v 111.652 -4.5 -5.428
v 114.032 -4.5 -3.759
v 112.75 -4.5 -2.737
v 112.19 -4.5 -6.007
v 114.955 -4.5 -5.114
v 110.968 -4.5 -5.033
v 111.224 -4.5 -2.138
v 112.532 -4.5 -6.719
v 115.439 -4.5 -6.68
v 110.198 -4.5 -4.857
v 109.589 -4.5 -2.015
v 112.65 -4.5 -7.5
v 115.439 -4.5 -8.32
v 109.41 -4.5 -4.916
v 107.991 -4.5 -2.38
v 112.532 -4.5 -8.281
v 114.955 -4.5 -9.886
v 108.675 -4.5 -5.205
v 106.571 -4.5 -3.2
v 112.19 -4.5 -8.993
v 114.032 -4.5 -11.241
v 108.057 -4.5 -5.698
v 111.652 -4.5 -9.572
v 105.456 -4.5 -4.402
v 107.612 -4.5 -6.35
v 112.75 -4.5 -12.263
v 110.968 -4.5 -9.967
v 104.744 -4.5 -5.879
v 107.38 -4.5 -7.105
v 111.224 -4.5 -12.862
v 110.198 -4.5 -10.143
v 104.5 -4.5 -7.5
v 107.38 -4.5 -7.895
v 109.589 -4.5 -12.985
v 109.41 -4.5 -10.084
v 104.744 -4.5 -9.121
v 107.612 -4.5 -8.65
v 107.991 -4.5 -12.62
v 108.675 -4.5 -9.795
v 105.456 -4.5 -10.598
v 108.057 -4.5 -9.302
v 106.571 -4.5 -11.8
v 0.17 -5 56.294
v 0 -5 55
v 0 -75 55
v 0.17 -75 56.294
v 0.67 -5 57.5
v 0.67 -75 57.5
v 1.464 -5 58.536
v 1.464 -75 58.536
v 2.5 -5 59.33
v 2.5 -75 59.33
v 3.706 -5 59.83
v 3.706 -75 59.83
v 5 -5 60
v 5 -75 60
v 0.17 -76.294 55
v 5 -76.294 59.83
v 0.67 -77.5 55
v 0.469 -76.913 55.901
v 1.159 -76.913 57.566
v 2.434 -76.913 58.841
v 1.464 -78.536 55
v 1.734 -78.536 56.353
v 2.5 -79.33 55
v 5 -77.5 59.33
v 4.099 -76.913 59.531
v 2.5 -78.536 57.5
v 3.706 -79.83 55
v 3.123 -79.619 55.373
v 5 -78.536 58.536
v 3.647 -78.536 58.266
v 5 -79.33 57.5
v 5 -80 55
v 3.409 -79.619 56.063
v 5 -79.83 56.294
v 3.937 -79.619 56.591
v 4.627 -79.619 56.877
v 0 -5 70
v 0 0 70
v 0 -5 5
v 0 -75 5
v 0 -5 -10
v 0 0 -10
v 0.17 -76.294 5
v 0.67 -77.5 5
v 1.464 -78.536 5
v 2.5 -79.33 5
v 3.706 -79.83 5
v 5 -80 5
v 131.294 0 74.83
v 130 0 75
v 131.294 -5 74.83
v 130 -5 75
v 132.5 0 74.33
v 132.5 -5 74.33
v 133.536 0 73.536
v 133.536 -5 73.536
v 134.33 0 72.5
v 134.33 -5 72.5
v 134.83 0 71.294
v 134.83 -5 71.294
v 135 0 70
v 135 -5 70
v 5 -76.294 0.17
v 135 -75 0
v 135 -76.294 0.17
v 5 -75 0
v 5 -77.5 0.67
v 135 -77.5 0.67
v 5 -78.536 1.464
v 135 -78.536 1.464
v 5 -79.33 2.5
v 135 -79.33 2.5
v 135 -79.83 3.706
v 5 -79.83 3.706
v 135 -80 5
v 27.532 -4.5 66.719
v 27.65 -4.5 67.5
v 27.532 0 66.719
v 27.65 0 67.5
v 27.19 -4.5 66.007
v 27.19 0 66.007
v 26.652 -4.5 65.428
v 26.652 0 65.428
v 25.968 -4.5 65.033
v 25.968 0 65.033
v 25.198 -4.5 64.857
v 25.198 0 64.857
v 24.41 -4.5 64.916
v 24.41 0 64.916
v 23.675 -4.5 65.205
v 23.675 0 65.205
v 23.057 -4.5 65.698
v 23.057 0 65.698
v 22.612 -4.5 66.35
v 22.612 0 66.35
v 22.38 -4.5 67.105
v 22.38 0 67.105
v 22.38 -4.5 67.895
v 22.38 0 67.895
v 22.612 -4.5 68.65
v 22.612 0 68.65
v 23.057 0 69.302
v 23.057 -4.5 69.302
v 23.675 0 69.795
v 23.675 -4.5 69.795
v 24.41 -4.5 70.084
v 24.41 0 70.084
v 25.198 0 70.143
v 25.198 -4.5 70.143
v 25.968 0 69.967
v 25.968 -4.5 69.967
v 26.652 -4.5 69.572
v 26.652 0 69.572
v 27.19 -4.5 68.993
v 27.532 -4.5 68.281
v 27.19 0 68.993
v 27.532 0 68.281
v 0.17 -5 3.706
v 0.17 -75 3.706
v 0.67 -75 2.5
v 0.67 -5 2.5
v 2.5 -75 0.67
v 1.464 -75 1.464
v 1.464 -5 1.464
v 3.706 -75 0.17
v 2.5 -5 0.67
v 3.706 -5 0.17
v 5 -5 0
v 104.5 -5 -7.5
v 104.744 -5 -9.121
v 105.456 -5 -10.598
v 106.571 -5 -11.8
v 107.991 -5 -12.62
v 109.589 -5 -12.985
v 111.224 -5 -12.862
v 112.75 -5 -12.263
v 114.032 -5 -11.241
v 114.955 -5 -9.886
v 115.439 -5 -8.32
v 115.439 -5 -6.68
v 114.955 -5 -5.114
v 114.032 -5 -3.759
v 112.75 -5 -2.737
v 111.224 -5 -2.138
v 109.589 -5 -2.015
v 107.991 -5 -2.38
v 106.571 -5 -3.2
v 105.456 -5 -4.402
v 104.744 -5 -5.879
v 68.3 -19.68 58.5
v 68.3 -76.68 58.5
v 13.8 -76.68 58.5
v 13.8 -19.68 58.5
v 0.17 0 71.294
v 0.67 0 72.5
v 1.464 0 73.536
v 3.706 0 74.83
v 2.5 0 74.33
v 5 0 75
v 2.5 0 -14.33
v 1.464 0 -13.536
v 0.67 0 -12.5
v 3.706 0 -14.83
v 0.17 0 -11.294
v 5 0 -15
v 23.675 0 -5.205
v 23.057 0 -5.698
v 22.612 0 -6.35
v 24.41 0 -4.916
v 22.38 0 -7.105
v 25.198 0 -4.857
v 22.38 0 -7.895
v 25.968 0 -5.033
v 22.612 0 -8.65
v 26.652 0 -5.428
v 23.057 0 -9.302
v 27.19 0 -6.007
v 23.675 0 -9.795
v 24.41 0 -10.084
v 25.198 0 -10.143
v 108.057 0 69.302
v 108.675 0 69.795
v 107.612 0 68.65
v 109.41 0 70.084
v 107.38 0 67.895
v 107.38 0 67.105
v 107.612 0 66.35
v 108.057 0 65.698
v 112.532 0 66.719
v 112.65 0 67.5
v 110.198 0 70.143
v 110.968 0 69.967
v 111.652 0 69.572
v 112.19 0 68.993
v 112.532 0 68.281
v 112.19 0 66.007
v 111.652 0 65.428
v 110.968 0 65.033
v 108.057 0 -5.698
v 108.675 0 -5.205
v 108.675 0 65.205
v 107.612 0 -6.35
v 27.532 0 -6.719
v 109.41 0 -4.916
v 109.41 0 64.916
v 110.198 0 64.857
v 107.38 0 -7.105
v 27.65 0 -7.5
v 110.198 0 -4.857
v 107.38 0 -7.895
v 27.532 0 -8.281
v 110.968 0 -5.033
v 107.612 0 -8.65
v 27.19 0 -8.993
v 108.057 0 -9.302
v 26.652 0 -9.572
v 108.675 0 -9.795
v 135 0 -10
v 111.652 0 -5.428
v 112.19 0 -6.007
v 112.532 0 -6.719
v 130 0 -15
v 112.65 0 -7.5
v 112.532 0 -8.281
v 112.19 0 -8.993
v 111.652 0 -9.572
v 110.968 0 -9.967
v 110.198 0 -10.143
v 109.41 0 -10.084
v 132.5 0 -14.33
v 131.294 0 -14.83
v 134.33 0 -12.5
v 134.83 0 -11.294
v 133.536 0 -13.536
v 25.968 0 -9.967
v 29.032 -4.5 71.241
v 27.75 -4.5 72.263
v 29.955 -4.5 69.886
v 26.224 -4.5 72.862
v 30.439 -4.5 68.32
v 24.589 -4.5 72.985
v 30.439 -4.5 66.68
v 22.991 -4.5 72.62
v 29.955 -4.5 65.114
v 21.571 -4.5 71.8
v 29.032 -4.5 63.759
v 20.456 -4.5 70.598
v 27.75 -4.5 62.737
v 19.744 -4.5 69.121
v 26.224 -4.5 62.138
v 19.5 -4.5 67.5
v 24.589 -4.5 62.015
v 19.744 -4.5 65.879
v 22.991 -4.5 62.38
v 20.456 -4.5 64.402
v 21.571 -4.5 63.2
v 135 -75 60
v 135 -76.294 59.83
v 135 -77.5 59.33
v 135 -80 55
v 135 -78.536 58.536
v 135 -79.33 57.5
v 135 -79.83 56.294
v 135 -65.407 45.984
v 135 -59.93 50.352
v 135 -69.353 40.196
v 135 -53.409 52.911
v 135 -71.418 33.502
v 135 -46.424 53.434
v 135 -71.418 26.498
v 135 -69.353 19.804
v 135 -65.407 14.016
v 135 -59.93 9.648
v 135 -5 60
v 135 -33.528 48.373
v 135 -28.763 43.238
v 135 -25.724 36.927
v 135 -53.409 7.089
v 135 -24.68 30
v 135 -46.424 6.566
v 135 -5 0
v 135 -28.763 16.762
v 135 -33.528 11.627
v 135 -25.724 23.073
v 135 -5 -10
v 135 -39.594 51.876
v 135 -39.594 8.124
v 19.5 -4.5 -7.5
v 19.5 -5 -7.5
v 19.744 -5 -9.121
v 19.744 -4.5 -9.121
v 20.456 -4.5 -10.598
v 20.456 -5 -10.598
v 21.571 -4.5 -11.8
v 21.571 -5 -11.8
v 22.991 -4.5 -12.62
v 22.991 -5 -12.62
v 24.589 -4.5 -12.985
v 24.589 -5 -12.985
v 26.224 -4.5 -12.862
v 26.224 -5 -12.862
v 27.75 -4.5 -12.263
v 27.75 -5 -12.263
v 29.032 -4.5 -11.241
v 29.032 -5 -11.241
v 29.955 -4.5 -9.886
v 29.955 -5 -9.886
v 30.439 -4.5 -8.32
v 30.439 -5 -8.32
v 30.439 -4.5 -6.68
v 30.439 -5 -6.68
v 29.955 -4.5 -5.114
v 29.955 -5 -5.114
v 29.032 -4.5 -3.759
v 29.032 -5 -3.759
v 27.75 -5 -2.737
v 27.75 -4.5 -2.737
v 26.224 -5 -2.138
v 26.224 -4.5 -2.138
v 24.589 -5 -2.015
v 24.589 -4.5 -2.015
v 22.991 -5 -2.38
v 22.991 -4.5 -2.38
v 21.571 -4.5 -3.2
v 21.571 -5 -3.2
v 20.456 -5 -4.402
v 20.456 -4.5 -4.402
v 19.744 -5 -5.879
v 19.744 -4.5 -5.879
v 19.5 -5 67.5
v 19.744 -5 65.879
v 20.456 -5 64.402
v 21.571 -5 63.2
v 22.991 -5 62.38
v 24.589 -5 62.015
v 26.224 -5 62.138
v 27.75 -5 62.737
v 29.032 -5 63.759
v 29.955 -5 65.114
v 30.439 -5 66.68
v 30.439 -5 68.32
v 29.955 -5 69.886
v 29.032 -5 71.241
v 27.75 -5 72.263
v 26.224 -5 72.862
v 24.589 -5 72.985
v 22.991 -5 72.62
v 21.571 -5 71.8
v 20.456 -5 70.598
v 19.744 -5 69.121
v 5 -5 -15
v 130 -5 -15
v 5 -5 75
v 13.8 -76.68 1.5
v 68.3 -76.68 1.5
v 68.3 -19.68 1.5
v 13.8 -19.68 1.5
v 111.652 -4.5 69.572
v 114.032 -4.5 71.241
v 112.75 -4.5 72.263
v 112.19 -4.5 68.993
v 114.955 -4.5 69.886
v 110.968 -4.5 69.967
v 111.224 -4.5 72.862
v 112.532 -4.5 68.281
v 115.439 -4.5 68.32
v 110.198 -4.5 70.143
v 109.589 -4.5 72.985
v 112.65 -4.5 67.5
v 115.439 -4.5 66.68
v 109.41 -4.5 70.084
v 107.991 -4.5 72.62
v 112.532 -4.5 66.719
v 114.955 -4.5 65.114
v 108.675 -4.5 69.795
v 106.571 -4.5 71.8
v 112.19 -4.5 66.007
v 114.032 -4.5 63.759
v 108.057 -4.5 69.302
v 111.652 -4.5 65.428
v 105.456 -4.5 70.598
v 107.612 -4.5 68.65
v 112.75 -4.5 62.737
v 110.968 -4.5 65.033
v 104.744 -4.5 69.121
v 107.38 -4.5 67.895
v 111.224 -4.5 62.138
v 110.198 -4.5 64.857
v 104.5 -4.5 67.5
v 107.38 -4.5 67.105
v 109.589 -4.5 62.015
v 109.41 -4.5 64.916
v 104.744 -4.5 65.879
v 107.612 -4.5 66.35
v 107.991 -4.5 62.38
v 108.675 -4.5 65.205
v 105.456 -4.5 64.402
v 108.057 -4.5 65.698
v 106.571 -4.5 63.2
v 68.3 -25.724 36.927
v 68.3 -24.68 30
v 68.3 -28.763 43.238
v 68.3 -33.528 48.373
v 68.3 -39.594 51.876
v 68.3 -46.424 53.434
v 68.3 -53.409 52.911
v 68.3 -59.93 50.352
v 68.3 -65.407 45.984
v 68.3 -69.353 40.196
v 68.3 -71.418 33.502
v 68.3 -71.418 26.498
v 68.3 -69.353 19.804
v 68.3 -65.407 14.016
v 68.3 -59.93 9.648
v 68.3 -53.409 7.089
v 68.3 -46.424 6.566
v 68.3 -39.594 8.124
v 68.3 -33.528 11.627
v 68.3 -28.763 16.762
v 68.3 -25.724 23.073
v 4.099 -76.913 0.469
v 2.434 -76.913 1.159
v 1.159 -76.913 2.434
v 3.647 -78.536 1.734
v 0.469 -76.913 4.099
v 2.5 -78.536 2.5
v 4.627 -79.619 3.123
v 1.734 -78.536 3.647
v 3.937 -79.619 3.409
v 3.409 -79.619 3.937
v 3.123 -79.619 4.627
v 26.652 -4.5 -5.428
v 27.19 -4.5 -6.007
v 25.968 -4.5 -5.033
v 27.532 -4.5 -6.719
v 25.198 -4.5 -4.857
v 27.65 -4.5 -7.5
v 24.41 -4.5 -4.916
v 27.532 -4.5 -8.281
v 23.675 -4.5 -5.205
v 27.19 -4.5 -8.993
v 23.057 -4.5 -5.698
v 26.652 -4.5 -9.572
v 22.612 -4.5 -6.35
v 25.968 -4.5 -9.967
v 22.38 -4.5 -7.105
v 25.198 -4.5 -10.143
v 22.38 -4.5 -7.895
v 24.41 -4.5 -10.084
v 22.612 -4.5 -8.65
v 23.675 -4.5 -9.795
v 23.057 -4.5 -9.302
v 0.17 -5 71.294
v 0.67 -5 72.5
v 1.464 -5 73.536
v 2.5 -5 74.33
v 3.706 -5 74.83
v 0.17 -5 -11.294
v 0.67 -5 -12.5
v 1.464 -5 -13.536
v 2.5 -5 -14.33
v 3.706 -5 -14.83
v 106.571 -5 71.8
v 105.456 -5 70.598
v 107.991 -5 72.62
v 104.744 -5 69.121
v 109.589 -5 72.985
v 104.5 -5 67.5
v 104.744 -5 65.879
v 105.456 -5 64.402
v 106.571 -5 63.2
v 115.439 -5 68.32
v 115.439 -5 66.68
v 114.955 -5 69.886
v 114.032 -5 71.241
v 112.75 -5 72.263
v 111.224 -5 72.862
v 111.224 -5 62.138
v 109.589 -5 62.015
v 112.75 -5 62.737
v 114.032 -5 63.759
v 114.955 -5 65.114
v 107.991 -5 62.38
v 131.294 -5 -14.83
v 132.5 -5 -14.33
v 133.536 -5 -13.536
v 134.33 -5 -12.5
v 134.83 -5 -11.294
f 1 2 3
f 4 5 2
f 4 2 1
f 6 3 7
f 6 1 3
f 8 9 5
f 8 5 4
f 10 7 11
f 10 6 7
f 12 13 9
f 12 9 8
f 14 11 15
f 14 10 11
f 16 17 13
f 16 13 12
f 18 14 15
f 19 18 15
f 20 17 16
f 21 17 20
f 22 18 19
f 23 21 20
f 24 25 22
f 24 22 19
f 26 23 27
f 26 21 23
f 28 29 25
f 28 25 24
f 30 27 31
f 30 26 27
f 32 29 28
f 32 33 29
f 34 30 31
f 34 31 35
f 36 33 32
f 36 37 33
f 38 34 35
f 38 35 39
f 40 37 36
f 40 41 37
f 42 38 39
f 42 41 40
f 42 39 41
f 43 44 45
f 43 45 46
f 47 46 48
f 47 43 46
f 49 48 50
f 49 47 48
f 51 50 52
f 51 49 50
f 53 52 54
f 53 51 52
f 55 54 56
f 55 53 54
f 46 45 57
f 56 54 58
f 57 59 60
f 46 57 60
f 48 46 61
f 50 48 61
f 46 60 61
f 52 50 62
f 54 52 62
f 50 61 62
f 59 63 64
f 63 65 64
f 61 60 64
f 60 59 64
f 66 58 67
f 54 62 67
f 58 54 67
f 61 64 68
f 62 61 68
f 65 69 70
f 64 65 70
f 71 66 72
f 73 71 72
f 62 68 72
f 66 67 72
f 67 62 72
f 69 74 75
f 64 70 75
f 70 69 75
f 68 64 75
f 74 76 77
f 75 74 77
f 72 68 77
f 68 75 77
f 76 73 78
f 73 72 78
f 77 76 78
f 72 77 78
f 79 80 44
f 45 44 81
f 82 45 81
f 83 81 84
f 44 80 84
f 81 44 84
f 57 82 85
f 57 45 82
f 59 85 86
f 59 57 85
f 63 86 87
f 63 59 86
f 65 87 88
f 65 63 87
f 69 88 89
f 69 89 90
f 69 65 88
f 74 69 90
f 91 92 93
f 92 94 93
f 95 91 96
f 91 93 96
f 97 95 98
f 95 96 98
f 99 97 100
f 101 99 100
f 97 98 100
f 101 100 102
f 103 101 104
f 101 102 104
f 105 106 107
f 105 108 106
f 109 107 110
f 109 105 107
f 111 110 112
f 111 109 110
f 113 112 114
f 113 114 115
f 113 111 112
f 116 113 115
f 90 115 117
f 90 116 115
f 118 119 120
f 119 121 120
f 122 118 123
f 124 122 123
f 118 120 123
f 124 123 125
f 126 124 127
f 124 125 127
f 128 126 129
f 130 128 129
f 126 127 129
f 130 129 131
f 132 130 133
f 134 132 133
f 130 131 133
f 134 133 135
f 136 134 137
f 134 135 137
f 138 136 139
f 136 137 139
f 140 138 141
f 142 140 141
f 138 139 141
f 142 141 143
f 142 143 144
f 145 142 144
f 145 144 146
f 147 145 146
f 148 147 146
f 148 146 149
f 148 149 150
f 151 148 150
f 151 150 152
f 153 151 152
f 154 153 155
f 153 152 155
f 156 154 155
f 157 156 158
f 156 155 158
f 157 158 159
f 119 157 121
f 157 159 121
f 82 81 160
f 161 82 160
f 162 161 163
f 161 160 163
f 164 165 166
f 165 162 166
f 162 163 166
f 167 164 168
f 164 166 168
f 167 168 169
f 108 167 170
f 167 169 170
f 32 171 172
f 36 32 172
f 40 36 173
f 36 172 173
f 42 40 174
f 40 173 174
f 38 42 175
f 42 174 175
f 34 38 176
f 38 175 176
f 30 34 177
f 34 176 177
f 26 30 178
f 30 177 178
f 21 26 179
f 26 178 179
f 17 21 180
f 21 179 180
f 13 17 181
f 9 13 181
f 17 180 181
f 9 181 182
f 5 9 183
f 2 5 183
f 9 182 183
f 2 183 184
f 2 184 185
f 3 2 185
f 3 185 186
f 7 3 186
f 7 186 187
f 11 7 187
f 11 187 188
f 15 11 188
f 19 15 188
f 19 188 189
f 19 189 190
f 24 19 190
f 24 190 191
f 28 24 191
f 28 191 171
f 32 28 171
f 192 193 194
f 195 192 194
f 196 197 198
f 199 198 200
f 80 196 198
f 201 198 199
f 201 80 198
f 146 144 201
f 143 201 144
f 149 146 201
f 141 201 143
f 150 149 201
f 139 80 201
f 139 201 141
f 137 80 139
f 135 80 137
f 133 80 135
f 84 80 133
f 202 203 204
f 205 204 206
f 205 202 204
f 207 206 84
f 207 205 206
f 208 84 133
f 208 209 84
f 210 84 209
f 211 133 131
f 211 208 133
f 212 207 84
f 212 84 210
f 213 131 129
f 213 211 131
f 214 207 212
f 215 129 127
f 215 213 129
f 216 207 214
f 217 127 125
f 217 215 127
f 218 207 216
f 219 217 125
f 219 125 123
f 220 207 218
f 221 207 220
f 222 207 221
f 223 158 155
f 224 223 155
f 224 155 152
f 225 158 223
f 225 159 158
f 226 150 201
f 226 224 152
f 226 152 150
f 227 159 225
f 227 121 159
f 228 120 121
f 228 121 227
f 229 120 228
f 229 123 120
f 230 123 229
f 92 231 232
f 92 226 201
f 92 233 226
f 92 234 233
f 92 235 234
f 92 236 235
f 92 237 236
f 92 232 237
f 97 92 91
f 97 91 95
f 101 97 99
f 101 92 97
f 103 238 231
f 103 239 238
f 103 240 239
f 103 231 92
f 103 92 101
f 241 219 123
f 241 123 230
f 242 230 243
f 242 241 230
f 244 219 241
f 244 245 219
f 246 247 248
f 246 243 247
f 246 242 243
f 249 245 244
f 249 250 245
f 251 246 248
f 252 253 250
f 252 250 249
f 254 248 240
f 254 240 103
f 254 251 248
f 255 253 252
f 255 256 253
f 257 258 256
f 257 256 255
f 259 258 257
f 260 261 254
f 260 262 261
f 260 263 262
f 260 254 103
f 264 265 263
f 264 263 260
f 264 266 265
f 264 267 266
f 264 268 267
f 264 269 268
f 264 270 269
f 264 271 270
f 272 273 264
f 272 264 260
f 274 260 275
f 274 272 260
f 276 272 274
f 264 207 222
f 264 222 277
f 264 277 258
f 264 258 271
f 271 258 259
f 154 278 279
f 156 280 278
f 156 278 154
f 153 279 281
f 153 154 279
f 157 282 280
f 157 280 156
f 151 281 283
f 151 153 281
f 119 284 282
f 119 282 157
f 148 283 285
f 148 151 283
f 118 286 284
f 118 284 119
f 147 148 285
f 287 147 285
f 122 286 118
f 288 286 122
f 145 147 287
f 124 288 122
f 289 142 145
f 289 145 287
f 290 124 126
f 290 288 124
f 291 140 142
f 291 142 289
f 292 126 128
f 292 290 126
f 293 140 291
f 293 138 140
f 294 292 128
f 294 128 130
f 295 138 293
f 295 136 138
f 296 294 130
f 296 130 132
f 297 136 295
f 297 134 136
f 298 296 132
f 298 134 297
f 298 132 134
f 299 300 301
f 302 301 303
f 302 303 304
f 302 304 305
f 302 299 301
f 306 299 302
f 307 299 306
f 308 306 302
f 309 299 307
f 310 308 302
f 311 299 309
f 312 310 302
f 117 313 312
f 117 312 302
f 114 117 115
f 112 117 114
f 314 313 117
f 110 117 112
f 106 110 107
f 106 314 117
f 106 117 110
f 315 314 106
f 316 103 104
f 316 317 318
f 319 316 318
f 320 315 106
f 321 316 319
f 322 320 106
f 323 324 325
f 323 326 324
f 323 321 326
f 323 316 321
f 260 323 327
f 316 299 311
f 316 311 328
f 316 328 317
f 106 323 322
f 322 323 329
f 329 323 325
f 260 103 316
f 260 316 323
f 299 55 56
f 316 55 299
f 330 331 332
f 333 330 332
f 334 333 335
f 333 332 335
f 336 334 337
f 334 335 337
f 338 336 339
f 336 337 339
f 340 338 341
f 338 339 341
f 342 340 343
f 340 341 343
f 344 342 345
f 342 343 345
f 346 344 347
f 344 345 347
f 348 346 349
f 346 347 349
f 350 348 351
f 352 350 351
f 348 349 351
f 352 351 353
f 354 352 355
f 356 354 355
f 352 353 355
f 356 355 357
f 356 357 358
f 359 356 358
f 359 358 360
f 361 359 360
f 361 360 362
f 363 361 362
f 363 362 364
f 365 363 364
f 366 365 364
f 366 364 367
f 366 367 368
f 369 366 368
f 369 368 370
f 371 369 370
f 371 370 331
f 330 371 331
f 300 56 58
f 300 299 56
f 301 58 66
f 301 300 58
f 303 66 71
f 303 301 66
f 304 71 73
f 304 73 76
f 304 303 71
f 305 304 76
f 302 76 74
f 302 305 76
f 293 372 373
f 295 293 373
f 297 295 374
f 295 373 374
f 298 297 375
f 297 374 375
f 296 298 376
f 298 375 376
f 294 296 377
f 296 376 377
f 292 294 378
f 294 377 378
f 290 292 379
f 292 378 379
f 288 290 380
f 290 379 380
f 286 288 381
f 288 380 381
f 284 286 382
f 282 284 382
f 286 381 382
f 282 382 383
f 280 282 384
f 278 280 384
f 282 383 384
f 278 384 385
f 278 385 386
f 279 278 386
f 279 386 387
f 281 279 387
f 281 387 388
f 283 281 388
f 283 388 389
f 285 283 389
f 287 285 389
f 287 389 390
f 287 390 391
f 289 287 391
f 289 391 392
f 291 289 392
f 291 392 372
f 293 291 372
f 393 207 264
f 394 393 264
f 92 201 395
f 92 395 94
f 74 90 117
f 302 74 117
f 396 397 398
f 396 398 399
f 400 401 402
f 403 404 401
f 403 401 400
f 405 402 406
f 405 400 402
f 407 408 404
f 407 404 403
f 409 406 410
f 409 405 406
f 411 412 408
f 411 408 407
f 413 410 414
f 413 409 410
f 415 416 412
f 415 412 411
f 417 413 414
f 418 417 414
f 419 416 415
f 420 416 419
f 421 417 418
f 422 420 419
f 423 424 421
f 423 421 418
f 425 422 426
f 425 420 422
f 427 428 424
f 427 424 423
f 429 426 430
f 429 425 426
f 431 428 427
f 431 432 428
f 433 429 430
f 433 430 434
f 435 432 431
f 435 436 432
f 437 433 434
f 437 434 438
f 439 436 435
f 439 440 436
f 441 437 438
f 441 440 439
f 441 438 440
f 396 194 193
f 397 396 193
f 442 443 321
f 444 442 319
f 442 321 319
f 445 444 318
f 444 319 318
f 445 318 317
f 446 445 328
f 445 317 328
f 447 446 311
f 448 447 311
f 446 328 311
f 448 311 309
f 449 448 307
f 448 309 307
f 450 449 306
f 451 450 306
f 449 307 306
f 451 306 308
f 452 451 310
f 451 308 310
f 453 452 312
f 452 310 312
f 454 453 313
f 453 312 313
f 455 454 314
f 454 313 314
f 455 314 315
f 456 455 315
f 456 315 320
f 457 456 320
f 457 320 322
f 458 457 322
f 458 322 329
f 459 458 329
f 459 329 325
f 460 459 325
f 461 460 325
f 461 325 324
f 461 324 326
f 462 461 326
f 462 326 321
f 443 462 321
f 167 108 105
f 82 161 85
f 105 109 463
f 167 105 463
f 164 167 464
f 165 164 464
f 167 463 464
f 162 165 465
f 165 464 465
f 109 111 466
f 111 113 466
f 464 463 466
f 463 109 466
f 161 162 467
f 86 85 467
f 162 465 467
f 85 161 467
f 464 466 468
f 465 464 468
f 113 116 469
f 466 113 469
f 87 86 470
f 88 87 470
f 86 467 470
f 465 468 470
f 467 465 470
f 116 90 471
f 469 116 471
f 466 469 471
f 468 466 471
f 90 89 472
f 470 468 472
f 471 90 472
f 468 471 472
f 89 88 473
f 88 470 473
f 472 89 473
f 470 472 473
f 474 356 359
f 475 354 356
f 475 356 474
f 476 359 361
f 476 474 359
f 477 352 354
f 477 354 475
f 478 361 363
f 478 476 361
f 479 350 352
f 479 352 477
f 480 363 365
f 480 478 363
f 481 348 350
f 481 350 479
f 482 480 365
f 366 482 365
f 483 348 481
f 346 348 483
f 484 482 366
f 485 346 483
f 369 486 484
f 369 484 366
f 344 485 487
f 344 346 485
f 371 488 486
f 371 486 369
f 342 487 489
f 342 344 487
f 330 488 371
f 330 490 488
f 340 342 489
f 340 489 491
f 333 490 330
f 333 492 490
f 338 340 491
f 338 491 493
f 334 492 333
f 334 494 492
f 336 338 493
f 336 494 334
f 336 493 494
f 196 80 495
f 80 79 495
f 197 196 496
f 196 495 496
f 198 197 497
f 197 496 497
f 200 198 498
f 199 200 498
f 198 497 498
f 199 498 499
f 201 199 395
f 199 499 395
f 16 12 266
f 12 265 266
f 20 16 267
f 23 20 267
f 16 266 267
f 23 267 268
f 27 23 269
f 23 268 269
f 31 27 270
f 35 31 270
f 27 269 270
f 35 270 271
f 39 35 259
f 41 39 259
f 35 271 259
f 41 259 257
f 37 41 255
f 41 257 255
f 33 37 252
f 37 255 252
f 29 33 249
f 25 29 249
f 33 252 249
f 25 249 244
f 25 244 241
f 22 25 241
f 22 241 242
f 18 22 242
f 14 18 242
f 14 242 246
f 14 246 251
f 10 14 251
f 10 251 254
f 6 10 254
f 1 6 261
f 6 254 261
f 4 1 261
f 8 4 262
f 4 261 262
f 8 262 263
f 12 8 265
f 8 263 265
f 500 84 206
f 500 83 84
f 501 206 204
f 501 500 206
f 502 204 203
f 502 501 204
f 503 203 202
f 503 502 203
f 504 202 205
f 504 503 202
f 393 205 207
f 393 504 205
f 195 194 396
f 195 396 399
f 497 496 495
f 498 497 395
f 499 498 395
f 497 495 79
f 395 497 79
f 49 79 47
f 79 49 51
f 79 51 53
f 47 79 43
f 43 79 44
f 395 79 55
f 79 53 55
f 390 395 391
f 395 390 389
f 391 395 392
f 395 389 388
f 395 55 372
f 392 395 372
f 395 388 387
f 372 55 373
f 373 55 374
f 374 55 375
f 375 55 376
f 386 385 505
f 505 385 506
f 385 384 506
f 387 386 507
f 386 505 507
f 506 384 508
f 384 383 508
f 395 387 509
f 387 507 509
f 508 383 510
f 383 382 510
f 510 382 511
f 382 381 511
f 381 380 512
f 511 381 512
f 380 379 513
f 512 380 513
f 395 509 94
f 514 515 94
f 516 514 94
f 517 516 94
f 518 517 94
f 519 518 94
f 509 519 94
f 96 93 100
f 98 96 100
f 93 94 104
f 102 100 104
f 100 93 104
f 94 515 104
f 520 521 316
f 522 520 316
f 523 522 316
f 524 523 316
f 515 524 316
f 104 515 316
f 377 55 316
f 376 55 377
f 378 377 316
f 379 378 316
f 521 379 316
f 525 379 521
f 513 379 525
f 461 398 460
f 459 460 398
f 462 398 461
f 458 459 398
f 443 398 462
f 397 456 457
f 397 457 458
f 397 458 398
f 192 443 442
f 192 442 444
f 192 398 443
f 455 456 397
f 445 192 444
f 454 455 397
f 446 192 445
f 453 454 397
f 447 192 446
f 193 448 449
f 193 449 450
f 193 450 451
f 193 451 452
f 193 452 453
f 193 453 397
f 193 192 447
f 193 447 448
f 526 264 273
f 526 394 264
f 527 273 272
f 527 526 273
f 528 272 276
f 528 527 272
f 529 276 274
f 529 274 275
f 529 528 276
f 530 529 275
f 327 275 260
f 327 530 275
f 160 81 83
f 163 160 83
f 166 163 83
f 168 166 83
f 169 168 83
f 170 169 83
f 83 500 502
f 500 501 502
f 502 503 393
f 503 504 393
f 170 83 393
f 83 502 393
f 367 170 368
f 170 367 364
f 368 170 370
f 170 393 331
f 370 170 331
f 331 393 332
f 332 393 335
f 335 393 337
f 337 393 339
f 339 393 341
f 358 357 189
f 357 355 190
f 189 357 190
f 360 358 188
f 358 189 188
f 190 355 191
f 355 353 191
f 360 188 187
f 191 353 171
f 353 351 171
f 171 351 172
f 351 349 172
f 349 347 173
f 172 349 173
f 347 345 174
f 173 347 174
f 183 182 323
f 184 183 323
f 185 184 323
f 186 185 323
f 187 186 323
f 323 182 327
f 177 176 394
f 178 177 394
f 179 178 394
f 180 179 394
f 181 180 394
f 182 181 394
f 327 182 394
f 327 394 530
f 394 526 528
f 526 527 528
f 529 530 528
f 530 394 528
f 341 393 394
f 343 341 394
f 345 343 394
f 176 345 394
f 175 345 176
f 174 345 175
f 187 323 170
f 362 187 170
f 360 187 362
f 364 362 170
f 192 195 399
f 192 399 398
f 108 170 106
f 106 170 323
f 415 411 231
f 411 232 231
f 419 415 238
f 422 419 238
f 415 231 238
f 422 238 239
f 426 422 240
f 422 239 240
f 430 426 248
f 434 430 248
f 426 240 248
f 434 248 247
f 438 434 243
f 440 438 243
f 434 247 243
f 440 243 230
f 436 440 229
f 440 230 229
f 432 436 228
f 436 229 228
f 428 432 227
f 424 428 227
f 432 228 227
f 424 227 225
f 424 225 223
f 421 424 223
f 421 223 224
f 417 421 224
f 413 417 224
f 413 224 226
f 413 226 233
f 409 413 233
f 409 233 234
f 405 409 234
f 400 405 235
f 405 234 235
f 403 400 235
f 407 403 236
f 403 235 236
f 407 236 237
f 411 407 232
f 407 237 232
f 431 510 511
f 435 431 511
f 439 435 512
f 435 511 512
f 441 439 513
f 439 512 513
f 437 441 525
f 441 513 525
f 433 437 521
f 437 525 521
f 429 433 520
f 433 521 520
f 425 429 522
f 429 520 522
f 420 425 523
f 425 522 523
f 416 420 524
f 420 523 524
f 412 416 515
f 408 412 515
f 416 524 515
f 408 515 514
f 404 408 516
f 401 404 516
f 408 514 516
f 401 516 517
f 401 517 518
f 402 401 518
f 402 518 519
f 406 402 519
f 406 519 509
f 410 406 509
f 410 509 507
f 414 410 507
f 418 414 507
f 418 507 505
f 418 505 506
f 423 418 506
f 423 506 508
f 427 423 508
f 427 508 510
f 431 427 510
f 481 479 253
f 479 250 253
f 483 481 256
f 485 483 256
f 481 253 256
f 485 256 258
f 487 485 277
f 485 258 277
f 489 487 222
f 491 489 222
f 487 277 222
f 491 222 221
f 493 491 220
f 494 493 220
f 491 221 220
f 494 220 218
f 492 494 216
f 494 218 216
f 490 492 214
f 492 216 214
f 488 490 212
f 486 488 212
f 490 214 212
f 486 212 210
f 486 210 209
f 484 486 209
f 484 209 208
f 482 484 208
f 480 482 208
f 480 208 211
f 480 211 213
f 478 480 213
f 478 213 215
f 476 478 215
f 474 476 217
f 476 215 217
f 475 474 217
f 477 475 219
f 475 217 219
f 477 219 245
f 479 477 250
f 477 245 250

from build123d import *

# Parameters (mm, degrees)
SKETCH_1_W          = 135
SKETCH_1_H          = 80
EXTRUDE_1_DEPTH     = 60
CUT_EXTRUDE_START   = -1.5
CUT_EXTRUDE_1_DEPTH = 57
CUT_EXTRUDE_2_REACH = 170.003
SKETCH_4_R          = 23.5
SKETCH_5_W          = 135
SKETCH_5_H          = 15
EXTRUDE_2_DEPTH     = 5
M5_C_1_D            = 5.3
M5_C_1_DEPTH        = 5.2
M5_C_1_CBORE_D      = 11
M5_C_1_CBORE_DEPTH  = 0.5
M5_C_1_TIP          = 1.59228064
FILLET_1_R          = 5
FILLET_2_R          = 5
FILLET_3_R          = 5


with BuildPart() as part:
    # 草图1 → 凸台-拉伸1 (new body)
    with BuildSketch(Plane.XY):
        with Locations((67.5, -40)):
            Rectangle(SKETCH_1_W, SKETCH_1_H)
    extrude(amount=EXTRUDE_1_DEPTH)

    # 草图2 → 切除-拉伸1 (cut)
    with BuildSketch(Plane.XY.offset(60).offset(CUT_EXTRUDE_START)):
        Polygon((24.108601621, -76.68), (13.8, -76.68), (13.8, -19.68), (68.3, -19.68), (68.3, -76.68), align=None)
    extrude(amount=-CUT_EXTRUDE_1_DEPTH, mode=Mode.SUBTRACT)

    # 草图4 → 切除-拉伸2 (cut, up to next)
    with BuildSketch(Plane(origin=(135, 0, 0), x_dir=(0, 0, -1), z_dir=(1, 0, 0)), mode=Mode.PRIVATE) as cut_extrude_2_sk1:
        with Locations(Location((-30, -48.18, 0), (0, 0, 90))):
            Circle(SKETCH_4_R)
    cut_extrude_2_tool1 = extrude(cut_extrude_2_sk1.sketch, amount=-CUT_EXTRUDE_2_REACH, mode=Mode.PRIVATE) & part.part
    add(cut_extrude_2_tool1.solids().sort_by_distance((135, -48.18, 30))[0], mode=Mode.SUBTRACT)

    # 草图5 → 凸台-拉伸2 (add)
    with BuildSketch(Plane(origin=(0, 0, 0), x_dir=(1, 0, 0), z_dir=(0, 1, 0))):
        with Locations((67.5, 7.5)):
            Rectangle(SKETCH_5_W, SKETCH_5_H)
        with Locations((67.5, -67.5)):
            Rectangle(SKETCH_5_W, SKETCH_5_H)
    extrude(amount=-EXTRUDE_2_DEPTH)

    # M5 六角头螺栓C级的柱形沉头孔1
    with Locations(Plane(origin=(0, -5, 0), x_dir=(-1, 0, 0), z_dir=(0, -1, 0))):
        with Locations((-110, 7.5), (-25, 7.5), (-110, -67.5), (-25, -67.5)):
            CounterBoreHole(M5_C_1_D / 2, M5_C_1_CBORE_D / 2, M5_C_1_CBORE_DEPTH, depth=M5_C_1_DEPTH)
            with Locations((0, 0, -(M5_C_1_DEPTH + M5_C_1_TIP / 2))):  # 118° drill point
                Cone(0, M5_C_1_D / 2, M5_C_1_TIP, mode=Mode.SUBTRACT)

    # 圆角1
    fillet_1_edges = [part.edges().sort_by_distance(p)[0] for p in [
        (0, -42.5, 0),
        (0, -42.5, 60),
    ]]
    fillet(fillet_1_edges, radius=FILLET_1_R)

    # 圆角2
    fillet_2_edges = [part.edges().sort_by_distance(p)[0] for p in [
        (70, -80, 60),
        (70, -80, 0),
        (0, -80, 30),
        (1.464466094, -80, 1.464466094),
        (1.464466094, -80, 58.535533906),
    ]]
    fillet(fillet_2_edges, radius=FILLET_2_R)

    # 圆角3
    fillet_3_edges = [part.edges().sort_by_distance(p)[0] for p in [
        (0, -2.5, -15),
        (135, -2.5, -15),
        (135, -2.5, 75),
        (0, -2.5, 75),
    ]]
    fillet(fillet_3_edges, radius=FILLET_3_R)


solid = part.part
